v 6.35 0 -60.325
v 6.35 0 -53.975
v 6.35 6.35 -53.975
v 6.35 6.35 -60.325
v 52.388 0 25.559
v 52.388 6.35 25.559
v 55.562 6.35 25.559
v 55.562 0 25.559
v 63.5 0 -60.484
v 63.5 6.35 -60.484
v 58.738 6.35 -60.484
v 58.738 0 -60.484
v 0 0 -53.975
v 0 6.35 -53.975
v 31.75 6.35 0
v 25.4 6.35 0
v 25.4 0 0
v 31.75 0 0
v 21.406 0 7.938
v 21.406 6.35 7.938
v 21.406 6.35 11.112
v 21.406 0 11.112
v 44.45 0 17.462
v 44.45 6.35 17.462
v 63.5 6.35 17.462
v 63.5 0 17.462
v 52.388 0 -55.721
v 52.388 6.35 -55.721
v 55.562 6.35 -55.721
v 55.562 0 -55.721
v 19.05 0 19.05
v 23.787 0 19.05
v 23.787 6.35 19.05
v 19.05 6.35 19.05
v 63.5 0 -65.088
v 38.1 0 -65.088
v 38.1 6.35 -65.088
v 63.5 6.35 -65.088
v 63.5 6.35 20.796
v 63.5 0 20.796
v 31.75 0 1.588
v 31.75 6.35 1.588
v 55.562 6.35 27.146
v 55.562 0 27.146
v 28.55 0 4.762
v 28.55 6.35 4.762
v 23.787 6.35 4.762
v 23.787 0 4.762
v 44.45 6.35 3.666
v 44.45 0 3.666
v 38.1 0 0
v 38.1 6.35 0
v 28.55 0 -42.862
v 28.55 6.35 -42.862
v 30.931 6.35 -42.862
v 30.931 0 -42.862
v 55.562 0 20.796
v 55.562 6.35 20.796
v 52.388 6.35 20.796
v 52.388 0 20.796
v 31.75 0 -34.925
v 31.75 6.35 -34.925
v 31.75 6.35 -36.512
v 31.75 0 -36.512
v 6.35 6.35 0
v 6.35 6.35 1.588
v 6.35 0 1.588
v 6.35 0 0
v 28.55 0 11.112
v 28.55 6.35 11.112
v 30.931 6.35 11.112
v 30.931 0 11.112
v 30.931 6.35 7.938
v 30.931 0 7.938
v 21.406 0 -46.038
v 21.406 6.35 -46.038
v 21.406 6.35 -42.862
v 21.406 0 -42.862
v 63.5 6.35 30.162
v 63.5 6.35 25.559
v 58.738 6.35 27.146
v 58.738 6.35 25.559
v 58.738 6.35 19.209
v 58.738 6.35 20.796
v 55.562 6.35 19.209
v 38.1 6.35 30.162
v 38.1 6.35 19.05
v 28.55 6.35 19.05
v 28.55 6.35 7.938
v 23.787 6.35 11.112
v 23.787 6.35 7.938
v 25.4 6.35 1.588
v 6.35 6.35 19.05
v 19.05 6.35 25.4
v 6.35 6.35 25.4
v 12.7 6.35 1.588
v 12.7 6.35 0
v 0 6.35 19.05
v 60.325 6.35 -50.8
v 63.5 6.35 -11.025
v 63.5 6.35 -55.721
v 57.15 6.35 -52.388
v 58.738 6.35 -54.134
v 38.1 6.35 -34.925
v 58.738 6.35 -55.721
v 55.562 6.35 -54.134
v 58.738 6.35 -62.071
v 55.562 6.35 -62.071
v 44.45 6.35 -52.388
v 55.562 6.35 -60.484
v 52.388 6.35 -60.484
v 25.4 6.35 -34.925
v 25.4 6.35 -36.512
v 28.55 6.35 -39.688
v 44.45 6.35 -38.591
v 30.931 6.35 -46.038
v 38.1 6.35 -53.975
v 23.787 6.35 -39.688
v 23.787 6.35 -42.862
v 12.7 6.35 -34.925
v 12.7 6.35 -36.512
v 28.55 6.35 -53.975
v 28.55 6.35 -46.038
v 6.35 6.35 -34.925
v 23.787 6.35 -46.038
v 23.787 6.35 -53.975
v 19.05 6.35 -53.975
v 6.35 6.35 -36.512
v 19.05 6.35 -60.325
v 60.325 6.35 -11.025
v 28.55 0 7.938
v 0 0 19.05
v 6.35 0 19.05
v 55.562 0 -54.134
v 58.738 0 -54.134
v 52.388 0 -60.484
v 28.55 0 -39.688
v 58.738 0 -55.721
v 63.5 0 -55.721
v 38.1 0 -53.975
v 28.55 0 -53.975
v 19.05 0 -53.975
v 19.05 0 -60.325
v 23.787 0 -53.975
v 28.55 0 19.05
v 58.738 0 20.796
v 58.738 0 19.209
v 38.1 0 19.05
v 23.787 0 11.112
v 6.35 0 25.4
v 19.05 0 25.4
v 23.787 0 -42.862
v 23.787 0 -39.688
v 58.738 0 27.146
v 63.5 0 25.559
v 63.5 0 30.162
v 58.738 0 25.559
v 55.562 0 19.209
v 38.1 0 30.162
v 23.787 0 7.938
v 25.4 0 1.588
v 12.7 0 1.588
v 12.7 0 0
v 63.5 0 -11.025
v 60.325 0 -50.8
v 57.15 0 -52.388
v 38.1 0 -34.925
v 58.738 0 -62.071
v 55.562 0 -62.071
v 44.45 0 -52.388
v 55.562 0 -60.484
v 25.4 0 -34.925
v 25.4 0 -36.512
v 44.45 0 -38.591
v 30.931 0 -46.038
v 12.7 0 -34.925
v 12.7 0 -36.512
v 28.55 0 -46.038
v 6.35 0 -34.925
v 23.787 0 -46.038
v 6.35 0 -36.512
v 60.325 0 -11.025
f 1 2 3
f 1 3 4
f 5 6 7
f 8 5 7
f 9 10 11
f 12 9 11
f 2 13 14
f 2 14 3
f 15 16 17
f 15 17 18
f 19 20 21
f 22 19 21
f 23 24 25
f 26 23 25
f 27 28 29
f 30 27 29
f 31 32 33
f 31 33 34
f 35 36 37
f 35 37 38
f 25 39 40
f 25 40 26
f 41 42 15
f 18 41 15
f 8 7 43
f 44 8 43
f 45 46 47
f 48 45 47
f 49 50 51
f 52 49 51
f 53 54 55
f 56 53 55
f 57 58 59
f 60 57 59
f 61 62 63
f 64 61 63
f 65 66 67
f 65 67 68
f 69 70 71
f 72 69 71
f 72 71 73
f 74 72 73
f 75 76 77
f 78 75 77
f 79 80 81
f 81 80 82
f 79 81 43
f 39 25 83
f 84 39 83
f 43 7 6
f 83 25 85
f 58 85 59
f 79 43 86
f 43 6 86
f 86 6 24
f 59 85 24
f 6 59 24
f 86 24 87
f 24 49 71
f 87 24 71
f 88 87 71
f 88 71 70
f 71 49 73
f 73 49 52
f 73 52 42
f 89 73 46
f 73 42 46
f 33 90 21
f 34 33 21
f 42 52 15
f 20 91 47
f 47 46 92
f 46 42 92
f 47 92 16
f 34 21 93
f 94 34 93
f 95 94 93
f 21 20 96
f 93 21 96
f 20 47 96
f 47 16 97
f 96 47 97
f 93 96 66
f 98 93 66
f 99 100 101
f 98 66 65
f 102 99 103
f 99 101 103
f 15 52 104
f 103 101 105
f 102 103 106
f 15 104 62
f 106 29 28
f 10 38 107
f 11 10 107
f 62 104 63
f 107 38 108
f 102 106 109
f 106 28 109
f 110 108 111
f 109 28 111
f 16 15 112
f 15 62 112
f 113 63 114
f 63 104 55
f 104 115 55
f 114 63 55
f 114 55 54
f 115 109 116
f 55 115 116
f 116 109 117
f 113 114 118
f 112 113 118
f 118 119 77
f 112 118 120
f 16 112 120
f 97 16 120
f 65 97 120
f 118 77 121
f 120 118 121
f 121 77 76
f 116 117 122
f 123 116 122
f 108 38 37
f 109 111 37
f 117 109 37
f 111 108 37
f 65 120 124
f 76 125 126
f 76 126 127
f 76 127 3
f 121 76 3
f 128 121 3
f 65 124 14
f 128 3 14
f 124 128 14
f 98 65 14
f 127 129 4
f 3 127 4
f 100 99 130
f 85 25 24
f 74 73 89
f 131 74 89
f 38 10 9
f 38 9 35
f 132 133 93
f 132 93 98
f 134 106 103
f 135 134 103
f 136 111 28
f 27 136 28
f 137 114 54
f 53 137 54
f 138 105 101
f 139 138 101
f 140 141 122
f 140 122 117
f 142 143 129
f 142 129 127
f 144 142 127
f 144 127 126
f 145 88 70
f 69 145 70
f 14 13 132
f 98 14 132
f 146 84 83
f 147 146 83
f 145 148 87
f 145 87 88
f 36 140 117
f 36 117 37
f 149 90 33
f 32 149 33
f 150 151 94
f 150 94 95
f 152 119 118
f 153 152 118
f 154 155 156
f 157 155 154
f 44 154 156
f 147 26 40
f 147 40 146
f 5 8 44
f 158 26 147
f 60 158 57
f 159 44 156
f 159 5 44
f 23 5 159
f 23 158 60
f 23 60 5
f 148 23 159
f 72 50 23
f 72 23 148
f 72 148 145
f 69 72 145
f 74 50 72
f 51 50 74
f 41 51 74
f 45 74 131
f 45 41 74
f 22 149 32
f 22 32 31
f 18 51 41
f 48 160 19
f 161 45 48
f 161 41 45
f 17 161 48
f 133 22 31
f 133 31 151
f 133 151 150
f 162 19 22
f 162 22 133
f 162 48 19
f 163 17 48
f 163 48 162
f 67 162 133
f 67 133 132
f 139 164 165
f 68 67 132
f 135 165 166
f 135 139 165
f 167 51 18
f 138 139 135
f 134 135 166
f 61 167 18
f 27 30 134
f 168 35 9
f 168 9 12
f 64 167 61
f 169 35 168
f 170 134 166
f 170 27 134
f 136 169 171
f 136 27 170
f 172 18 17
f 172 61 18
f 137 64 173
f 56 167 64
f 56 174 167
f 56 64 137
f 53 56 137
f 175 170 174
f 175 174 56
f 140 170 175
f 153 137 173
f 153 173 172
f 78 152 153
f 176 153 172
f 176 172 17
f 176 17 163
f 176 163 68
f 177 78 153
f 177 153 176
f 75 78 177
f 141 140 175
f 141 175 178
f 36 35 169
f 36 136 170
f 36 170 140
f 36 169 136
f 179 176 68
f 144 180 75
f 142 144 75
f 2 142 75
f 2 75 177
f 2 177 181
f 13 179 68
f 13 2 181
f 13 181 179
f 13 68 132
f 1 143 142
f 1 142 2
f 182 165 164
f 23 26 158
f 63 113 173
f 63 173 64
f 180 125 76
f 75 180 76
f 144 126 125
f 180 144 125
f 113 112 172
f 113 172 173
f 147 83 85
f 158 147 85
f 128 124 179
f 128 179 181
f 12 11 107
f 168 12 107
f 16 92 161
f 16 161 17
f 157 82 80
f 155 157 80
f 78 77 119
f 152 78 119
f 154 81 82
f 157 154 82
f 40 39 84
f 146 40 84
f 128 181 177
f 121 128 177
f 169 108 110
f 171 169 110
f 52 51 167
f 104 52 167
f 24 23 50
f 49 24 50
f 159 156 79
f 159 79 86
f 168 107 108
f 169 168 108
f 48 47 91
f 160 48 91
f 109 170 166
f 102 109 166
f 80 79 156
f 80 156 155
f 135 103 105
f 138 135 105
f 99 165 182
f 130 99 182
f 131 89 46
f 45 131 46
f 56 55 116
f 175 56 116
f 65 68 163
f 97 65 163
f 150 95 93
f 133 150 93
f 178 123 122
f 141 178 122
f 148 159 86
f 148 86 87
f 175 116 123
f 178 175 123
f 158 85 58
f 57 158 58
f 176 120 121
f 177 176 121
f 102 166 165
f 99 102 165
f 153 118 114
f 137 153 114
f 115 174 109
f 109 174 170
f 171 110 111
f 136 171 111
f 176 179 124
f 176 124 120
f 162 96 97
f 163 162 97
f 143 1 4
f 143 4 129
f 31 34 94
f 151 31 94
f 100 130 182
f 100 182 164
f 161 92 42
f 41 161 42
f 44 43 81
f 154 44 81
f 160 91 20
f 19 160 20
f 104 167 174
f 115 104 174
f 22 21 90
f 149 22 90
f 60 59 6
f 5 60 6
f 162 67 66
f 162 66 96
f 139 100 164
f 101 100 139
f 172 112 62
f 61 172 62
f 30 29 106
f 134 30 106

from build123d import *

# Parameters (mm, degrees)
BOSS_EXTRUDE1_DEPTH = 6.35
SKETCH2_W           = 6.35
SKETCH2_H           = 1.5875
CUT_EXTRUDE1_DEPTH  = 6.35
CUT_EXTRUDE2_DEPTH  = 6.35
SKETCH4_W           = 36.519416468
SKETCH4_H           = 95.25
CUT_EXTRUDE5_DEPTH  = 6.35
SKETCH7_W           = 18.153928565
SKETCH7_H           = 28.487742684
CUT_EXTRUDE6_DEPTH  = 6.35


with BuildPart() as part:
    # Sketch1 → Boss-Extrude1 (new body)
    with BuildSketch(Plane(origin=(0, 0, 0), x_dir=(1, 0, 0), z_dir=(0, 1, 0))):
        Polygon((38.1, 65.0875), (66.675, 65.0875), (66.675, -30.1625), (38.1, -30.1625), (38.1, -19.05), (19.05, -19.05), (19.05, -25.4), (6.35, -25.4), (6.35, -19.05), (0, -19.05), (0, 0), (0, 34.925), (0, 53.975), (6.35, 53.975), (6.35, 60.325), (19.05, 60.325), (19.05, 53.975), (38.1, 53.975), align=None)
        Polygon((38.1, 34.925), (44.45, 38.591174209), (44.45, 52.3875), (57.15, 52.3875), (60.325, 50.8), (60.325, -15.875), (57.15, -17.4625), (44.45, -17.4625), (44.45, -3.666174209), (38.1, 0), align=None, mode=Mode.SUBTRACT)
    extrude(amount=BOSS_EXTRUDE1_DEPTH)

    # Sketch2 → Cut-Extrude1 (cut)
    with BuildSketch(Plane(origin=(0, 6.35, 0), x_dir=(1, 0, 0), z_dir=(0, 1, 0))):
        with Locations((9.525, 35.71875)):
            Rectangle(SKETCH2_W, SKETCH2_H)
        with Locations((9.525, -0.79375)):
            Rectangle(SKETCH2_W, SKETCH2_H)
        with Locations((28.575, 35.71875)):
            Rectangle(SKETCH2_W, SKETCH2_H)
        with Locations((28.575, -0.79375)):
            Rectangle(SKETCH2_W, SKETCH2_H)
    extrude(amount=-CUT_EXTRUDE1_DEPTH, mode=Mode.SUBTRACT)

    # Sketch3 → Cut-Extrude2 (cut)
    with BuildSketch(Plane(origin=(0, 6.35, 0), x_dir=(1, 0, 0), z_dir=(0, 1, 0))):
        Polygon((28.549517374, 53.975), (23.787017374, 53.975), (23.787017374, 46.0375), (21.405767374, 46.0375), (21.405767374, 42.8625), (23.787017374, 42.8625), (23.787017374, 39.6875), (28.549517374, 39.6875), (28.549517374, 42.8625), (30.930767374, 42.8625), (30.930767374, 46.0375), (28.549517374, 46.0375), align=None)
        Polygon((66.675, 55.72125), (66.675, 60.48375), (58.7375, 60.48375), (58.7375, 62.07125), (55.5625, 62.07125), (55.5625, 60.48375), (52.3875, 60.48375), (52.3875, 55.72125), (55.5625, 55.72125), (55.5625, 54.13375), (58.7375, 54.13375), (58.7375, 55.72125), align=None)
        Polygon((55.5625, -27.14625), (58.7375, -27.14625), (58.7375, -25.55875), (66.675, -25.55875), (66.675, -20.79625), (58.7375, -20.79625), (58.7375, -19.20875), (55.5625, -19.20875), (55.5625, -20.79625), (52.3875, -20.79625), (52.3875, -25.55875), (55.5625, -25.55875), align=None)
        Polygon((28.549517374, -11.1125), (30.930767374, -11.1125), (30.930767374, -7.9375), (28.549517374, -7.9375), (28.549517374, -4.7625), (23.787017374, -4.7625), (23.787017374, -7.9375), (21.405767374, -7.9375), (21.405767374, -11.1125), (23.787017374, -11.1125), (23.787017374, -19.05), (28.549517374, -19.05), align=None)
    extrude(amount=-CUT_EXTRUDE2_DEPTH, mode=Mode.SUBTRACT)

    # Sketch4 → Cut-Extrude5 (cut)
    with BuildSketch(Plane(origin=(0, 6.35, 0), x_dir=(1, 0, 0), z_dir=(0, 1, 0))):
        with Locations((81.759708234, 17.4625)):
            Rectangle(SKETCH4_W, SKETCH4_H)
    extrude(amount=-CUT_EXTRUDE5_DEPTH, mode=Mode.SUBTRACT)

    # Sketch7 → Cut-Extrude6 (cut)
    with BuildSketch(Plane(origin=(0, 6.35, 0), x_dir=(1, 0, 0), z_dir=(0, 1, 0))):
        with Locations((64.899881691, -3.218628658)):
            Rectangle(SKETCH7_W, SKETCH7_H)
    extrude(amount=-CUT_EXTRUDE6_DEPTH, mode=Mode.SUBTRACT)


solid = part.part
